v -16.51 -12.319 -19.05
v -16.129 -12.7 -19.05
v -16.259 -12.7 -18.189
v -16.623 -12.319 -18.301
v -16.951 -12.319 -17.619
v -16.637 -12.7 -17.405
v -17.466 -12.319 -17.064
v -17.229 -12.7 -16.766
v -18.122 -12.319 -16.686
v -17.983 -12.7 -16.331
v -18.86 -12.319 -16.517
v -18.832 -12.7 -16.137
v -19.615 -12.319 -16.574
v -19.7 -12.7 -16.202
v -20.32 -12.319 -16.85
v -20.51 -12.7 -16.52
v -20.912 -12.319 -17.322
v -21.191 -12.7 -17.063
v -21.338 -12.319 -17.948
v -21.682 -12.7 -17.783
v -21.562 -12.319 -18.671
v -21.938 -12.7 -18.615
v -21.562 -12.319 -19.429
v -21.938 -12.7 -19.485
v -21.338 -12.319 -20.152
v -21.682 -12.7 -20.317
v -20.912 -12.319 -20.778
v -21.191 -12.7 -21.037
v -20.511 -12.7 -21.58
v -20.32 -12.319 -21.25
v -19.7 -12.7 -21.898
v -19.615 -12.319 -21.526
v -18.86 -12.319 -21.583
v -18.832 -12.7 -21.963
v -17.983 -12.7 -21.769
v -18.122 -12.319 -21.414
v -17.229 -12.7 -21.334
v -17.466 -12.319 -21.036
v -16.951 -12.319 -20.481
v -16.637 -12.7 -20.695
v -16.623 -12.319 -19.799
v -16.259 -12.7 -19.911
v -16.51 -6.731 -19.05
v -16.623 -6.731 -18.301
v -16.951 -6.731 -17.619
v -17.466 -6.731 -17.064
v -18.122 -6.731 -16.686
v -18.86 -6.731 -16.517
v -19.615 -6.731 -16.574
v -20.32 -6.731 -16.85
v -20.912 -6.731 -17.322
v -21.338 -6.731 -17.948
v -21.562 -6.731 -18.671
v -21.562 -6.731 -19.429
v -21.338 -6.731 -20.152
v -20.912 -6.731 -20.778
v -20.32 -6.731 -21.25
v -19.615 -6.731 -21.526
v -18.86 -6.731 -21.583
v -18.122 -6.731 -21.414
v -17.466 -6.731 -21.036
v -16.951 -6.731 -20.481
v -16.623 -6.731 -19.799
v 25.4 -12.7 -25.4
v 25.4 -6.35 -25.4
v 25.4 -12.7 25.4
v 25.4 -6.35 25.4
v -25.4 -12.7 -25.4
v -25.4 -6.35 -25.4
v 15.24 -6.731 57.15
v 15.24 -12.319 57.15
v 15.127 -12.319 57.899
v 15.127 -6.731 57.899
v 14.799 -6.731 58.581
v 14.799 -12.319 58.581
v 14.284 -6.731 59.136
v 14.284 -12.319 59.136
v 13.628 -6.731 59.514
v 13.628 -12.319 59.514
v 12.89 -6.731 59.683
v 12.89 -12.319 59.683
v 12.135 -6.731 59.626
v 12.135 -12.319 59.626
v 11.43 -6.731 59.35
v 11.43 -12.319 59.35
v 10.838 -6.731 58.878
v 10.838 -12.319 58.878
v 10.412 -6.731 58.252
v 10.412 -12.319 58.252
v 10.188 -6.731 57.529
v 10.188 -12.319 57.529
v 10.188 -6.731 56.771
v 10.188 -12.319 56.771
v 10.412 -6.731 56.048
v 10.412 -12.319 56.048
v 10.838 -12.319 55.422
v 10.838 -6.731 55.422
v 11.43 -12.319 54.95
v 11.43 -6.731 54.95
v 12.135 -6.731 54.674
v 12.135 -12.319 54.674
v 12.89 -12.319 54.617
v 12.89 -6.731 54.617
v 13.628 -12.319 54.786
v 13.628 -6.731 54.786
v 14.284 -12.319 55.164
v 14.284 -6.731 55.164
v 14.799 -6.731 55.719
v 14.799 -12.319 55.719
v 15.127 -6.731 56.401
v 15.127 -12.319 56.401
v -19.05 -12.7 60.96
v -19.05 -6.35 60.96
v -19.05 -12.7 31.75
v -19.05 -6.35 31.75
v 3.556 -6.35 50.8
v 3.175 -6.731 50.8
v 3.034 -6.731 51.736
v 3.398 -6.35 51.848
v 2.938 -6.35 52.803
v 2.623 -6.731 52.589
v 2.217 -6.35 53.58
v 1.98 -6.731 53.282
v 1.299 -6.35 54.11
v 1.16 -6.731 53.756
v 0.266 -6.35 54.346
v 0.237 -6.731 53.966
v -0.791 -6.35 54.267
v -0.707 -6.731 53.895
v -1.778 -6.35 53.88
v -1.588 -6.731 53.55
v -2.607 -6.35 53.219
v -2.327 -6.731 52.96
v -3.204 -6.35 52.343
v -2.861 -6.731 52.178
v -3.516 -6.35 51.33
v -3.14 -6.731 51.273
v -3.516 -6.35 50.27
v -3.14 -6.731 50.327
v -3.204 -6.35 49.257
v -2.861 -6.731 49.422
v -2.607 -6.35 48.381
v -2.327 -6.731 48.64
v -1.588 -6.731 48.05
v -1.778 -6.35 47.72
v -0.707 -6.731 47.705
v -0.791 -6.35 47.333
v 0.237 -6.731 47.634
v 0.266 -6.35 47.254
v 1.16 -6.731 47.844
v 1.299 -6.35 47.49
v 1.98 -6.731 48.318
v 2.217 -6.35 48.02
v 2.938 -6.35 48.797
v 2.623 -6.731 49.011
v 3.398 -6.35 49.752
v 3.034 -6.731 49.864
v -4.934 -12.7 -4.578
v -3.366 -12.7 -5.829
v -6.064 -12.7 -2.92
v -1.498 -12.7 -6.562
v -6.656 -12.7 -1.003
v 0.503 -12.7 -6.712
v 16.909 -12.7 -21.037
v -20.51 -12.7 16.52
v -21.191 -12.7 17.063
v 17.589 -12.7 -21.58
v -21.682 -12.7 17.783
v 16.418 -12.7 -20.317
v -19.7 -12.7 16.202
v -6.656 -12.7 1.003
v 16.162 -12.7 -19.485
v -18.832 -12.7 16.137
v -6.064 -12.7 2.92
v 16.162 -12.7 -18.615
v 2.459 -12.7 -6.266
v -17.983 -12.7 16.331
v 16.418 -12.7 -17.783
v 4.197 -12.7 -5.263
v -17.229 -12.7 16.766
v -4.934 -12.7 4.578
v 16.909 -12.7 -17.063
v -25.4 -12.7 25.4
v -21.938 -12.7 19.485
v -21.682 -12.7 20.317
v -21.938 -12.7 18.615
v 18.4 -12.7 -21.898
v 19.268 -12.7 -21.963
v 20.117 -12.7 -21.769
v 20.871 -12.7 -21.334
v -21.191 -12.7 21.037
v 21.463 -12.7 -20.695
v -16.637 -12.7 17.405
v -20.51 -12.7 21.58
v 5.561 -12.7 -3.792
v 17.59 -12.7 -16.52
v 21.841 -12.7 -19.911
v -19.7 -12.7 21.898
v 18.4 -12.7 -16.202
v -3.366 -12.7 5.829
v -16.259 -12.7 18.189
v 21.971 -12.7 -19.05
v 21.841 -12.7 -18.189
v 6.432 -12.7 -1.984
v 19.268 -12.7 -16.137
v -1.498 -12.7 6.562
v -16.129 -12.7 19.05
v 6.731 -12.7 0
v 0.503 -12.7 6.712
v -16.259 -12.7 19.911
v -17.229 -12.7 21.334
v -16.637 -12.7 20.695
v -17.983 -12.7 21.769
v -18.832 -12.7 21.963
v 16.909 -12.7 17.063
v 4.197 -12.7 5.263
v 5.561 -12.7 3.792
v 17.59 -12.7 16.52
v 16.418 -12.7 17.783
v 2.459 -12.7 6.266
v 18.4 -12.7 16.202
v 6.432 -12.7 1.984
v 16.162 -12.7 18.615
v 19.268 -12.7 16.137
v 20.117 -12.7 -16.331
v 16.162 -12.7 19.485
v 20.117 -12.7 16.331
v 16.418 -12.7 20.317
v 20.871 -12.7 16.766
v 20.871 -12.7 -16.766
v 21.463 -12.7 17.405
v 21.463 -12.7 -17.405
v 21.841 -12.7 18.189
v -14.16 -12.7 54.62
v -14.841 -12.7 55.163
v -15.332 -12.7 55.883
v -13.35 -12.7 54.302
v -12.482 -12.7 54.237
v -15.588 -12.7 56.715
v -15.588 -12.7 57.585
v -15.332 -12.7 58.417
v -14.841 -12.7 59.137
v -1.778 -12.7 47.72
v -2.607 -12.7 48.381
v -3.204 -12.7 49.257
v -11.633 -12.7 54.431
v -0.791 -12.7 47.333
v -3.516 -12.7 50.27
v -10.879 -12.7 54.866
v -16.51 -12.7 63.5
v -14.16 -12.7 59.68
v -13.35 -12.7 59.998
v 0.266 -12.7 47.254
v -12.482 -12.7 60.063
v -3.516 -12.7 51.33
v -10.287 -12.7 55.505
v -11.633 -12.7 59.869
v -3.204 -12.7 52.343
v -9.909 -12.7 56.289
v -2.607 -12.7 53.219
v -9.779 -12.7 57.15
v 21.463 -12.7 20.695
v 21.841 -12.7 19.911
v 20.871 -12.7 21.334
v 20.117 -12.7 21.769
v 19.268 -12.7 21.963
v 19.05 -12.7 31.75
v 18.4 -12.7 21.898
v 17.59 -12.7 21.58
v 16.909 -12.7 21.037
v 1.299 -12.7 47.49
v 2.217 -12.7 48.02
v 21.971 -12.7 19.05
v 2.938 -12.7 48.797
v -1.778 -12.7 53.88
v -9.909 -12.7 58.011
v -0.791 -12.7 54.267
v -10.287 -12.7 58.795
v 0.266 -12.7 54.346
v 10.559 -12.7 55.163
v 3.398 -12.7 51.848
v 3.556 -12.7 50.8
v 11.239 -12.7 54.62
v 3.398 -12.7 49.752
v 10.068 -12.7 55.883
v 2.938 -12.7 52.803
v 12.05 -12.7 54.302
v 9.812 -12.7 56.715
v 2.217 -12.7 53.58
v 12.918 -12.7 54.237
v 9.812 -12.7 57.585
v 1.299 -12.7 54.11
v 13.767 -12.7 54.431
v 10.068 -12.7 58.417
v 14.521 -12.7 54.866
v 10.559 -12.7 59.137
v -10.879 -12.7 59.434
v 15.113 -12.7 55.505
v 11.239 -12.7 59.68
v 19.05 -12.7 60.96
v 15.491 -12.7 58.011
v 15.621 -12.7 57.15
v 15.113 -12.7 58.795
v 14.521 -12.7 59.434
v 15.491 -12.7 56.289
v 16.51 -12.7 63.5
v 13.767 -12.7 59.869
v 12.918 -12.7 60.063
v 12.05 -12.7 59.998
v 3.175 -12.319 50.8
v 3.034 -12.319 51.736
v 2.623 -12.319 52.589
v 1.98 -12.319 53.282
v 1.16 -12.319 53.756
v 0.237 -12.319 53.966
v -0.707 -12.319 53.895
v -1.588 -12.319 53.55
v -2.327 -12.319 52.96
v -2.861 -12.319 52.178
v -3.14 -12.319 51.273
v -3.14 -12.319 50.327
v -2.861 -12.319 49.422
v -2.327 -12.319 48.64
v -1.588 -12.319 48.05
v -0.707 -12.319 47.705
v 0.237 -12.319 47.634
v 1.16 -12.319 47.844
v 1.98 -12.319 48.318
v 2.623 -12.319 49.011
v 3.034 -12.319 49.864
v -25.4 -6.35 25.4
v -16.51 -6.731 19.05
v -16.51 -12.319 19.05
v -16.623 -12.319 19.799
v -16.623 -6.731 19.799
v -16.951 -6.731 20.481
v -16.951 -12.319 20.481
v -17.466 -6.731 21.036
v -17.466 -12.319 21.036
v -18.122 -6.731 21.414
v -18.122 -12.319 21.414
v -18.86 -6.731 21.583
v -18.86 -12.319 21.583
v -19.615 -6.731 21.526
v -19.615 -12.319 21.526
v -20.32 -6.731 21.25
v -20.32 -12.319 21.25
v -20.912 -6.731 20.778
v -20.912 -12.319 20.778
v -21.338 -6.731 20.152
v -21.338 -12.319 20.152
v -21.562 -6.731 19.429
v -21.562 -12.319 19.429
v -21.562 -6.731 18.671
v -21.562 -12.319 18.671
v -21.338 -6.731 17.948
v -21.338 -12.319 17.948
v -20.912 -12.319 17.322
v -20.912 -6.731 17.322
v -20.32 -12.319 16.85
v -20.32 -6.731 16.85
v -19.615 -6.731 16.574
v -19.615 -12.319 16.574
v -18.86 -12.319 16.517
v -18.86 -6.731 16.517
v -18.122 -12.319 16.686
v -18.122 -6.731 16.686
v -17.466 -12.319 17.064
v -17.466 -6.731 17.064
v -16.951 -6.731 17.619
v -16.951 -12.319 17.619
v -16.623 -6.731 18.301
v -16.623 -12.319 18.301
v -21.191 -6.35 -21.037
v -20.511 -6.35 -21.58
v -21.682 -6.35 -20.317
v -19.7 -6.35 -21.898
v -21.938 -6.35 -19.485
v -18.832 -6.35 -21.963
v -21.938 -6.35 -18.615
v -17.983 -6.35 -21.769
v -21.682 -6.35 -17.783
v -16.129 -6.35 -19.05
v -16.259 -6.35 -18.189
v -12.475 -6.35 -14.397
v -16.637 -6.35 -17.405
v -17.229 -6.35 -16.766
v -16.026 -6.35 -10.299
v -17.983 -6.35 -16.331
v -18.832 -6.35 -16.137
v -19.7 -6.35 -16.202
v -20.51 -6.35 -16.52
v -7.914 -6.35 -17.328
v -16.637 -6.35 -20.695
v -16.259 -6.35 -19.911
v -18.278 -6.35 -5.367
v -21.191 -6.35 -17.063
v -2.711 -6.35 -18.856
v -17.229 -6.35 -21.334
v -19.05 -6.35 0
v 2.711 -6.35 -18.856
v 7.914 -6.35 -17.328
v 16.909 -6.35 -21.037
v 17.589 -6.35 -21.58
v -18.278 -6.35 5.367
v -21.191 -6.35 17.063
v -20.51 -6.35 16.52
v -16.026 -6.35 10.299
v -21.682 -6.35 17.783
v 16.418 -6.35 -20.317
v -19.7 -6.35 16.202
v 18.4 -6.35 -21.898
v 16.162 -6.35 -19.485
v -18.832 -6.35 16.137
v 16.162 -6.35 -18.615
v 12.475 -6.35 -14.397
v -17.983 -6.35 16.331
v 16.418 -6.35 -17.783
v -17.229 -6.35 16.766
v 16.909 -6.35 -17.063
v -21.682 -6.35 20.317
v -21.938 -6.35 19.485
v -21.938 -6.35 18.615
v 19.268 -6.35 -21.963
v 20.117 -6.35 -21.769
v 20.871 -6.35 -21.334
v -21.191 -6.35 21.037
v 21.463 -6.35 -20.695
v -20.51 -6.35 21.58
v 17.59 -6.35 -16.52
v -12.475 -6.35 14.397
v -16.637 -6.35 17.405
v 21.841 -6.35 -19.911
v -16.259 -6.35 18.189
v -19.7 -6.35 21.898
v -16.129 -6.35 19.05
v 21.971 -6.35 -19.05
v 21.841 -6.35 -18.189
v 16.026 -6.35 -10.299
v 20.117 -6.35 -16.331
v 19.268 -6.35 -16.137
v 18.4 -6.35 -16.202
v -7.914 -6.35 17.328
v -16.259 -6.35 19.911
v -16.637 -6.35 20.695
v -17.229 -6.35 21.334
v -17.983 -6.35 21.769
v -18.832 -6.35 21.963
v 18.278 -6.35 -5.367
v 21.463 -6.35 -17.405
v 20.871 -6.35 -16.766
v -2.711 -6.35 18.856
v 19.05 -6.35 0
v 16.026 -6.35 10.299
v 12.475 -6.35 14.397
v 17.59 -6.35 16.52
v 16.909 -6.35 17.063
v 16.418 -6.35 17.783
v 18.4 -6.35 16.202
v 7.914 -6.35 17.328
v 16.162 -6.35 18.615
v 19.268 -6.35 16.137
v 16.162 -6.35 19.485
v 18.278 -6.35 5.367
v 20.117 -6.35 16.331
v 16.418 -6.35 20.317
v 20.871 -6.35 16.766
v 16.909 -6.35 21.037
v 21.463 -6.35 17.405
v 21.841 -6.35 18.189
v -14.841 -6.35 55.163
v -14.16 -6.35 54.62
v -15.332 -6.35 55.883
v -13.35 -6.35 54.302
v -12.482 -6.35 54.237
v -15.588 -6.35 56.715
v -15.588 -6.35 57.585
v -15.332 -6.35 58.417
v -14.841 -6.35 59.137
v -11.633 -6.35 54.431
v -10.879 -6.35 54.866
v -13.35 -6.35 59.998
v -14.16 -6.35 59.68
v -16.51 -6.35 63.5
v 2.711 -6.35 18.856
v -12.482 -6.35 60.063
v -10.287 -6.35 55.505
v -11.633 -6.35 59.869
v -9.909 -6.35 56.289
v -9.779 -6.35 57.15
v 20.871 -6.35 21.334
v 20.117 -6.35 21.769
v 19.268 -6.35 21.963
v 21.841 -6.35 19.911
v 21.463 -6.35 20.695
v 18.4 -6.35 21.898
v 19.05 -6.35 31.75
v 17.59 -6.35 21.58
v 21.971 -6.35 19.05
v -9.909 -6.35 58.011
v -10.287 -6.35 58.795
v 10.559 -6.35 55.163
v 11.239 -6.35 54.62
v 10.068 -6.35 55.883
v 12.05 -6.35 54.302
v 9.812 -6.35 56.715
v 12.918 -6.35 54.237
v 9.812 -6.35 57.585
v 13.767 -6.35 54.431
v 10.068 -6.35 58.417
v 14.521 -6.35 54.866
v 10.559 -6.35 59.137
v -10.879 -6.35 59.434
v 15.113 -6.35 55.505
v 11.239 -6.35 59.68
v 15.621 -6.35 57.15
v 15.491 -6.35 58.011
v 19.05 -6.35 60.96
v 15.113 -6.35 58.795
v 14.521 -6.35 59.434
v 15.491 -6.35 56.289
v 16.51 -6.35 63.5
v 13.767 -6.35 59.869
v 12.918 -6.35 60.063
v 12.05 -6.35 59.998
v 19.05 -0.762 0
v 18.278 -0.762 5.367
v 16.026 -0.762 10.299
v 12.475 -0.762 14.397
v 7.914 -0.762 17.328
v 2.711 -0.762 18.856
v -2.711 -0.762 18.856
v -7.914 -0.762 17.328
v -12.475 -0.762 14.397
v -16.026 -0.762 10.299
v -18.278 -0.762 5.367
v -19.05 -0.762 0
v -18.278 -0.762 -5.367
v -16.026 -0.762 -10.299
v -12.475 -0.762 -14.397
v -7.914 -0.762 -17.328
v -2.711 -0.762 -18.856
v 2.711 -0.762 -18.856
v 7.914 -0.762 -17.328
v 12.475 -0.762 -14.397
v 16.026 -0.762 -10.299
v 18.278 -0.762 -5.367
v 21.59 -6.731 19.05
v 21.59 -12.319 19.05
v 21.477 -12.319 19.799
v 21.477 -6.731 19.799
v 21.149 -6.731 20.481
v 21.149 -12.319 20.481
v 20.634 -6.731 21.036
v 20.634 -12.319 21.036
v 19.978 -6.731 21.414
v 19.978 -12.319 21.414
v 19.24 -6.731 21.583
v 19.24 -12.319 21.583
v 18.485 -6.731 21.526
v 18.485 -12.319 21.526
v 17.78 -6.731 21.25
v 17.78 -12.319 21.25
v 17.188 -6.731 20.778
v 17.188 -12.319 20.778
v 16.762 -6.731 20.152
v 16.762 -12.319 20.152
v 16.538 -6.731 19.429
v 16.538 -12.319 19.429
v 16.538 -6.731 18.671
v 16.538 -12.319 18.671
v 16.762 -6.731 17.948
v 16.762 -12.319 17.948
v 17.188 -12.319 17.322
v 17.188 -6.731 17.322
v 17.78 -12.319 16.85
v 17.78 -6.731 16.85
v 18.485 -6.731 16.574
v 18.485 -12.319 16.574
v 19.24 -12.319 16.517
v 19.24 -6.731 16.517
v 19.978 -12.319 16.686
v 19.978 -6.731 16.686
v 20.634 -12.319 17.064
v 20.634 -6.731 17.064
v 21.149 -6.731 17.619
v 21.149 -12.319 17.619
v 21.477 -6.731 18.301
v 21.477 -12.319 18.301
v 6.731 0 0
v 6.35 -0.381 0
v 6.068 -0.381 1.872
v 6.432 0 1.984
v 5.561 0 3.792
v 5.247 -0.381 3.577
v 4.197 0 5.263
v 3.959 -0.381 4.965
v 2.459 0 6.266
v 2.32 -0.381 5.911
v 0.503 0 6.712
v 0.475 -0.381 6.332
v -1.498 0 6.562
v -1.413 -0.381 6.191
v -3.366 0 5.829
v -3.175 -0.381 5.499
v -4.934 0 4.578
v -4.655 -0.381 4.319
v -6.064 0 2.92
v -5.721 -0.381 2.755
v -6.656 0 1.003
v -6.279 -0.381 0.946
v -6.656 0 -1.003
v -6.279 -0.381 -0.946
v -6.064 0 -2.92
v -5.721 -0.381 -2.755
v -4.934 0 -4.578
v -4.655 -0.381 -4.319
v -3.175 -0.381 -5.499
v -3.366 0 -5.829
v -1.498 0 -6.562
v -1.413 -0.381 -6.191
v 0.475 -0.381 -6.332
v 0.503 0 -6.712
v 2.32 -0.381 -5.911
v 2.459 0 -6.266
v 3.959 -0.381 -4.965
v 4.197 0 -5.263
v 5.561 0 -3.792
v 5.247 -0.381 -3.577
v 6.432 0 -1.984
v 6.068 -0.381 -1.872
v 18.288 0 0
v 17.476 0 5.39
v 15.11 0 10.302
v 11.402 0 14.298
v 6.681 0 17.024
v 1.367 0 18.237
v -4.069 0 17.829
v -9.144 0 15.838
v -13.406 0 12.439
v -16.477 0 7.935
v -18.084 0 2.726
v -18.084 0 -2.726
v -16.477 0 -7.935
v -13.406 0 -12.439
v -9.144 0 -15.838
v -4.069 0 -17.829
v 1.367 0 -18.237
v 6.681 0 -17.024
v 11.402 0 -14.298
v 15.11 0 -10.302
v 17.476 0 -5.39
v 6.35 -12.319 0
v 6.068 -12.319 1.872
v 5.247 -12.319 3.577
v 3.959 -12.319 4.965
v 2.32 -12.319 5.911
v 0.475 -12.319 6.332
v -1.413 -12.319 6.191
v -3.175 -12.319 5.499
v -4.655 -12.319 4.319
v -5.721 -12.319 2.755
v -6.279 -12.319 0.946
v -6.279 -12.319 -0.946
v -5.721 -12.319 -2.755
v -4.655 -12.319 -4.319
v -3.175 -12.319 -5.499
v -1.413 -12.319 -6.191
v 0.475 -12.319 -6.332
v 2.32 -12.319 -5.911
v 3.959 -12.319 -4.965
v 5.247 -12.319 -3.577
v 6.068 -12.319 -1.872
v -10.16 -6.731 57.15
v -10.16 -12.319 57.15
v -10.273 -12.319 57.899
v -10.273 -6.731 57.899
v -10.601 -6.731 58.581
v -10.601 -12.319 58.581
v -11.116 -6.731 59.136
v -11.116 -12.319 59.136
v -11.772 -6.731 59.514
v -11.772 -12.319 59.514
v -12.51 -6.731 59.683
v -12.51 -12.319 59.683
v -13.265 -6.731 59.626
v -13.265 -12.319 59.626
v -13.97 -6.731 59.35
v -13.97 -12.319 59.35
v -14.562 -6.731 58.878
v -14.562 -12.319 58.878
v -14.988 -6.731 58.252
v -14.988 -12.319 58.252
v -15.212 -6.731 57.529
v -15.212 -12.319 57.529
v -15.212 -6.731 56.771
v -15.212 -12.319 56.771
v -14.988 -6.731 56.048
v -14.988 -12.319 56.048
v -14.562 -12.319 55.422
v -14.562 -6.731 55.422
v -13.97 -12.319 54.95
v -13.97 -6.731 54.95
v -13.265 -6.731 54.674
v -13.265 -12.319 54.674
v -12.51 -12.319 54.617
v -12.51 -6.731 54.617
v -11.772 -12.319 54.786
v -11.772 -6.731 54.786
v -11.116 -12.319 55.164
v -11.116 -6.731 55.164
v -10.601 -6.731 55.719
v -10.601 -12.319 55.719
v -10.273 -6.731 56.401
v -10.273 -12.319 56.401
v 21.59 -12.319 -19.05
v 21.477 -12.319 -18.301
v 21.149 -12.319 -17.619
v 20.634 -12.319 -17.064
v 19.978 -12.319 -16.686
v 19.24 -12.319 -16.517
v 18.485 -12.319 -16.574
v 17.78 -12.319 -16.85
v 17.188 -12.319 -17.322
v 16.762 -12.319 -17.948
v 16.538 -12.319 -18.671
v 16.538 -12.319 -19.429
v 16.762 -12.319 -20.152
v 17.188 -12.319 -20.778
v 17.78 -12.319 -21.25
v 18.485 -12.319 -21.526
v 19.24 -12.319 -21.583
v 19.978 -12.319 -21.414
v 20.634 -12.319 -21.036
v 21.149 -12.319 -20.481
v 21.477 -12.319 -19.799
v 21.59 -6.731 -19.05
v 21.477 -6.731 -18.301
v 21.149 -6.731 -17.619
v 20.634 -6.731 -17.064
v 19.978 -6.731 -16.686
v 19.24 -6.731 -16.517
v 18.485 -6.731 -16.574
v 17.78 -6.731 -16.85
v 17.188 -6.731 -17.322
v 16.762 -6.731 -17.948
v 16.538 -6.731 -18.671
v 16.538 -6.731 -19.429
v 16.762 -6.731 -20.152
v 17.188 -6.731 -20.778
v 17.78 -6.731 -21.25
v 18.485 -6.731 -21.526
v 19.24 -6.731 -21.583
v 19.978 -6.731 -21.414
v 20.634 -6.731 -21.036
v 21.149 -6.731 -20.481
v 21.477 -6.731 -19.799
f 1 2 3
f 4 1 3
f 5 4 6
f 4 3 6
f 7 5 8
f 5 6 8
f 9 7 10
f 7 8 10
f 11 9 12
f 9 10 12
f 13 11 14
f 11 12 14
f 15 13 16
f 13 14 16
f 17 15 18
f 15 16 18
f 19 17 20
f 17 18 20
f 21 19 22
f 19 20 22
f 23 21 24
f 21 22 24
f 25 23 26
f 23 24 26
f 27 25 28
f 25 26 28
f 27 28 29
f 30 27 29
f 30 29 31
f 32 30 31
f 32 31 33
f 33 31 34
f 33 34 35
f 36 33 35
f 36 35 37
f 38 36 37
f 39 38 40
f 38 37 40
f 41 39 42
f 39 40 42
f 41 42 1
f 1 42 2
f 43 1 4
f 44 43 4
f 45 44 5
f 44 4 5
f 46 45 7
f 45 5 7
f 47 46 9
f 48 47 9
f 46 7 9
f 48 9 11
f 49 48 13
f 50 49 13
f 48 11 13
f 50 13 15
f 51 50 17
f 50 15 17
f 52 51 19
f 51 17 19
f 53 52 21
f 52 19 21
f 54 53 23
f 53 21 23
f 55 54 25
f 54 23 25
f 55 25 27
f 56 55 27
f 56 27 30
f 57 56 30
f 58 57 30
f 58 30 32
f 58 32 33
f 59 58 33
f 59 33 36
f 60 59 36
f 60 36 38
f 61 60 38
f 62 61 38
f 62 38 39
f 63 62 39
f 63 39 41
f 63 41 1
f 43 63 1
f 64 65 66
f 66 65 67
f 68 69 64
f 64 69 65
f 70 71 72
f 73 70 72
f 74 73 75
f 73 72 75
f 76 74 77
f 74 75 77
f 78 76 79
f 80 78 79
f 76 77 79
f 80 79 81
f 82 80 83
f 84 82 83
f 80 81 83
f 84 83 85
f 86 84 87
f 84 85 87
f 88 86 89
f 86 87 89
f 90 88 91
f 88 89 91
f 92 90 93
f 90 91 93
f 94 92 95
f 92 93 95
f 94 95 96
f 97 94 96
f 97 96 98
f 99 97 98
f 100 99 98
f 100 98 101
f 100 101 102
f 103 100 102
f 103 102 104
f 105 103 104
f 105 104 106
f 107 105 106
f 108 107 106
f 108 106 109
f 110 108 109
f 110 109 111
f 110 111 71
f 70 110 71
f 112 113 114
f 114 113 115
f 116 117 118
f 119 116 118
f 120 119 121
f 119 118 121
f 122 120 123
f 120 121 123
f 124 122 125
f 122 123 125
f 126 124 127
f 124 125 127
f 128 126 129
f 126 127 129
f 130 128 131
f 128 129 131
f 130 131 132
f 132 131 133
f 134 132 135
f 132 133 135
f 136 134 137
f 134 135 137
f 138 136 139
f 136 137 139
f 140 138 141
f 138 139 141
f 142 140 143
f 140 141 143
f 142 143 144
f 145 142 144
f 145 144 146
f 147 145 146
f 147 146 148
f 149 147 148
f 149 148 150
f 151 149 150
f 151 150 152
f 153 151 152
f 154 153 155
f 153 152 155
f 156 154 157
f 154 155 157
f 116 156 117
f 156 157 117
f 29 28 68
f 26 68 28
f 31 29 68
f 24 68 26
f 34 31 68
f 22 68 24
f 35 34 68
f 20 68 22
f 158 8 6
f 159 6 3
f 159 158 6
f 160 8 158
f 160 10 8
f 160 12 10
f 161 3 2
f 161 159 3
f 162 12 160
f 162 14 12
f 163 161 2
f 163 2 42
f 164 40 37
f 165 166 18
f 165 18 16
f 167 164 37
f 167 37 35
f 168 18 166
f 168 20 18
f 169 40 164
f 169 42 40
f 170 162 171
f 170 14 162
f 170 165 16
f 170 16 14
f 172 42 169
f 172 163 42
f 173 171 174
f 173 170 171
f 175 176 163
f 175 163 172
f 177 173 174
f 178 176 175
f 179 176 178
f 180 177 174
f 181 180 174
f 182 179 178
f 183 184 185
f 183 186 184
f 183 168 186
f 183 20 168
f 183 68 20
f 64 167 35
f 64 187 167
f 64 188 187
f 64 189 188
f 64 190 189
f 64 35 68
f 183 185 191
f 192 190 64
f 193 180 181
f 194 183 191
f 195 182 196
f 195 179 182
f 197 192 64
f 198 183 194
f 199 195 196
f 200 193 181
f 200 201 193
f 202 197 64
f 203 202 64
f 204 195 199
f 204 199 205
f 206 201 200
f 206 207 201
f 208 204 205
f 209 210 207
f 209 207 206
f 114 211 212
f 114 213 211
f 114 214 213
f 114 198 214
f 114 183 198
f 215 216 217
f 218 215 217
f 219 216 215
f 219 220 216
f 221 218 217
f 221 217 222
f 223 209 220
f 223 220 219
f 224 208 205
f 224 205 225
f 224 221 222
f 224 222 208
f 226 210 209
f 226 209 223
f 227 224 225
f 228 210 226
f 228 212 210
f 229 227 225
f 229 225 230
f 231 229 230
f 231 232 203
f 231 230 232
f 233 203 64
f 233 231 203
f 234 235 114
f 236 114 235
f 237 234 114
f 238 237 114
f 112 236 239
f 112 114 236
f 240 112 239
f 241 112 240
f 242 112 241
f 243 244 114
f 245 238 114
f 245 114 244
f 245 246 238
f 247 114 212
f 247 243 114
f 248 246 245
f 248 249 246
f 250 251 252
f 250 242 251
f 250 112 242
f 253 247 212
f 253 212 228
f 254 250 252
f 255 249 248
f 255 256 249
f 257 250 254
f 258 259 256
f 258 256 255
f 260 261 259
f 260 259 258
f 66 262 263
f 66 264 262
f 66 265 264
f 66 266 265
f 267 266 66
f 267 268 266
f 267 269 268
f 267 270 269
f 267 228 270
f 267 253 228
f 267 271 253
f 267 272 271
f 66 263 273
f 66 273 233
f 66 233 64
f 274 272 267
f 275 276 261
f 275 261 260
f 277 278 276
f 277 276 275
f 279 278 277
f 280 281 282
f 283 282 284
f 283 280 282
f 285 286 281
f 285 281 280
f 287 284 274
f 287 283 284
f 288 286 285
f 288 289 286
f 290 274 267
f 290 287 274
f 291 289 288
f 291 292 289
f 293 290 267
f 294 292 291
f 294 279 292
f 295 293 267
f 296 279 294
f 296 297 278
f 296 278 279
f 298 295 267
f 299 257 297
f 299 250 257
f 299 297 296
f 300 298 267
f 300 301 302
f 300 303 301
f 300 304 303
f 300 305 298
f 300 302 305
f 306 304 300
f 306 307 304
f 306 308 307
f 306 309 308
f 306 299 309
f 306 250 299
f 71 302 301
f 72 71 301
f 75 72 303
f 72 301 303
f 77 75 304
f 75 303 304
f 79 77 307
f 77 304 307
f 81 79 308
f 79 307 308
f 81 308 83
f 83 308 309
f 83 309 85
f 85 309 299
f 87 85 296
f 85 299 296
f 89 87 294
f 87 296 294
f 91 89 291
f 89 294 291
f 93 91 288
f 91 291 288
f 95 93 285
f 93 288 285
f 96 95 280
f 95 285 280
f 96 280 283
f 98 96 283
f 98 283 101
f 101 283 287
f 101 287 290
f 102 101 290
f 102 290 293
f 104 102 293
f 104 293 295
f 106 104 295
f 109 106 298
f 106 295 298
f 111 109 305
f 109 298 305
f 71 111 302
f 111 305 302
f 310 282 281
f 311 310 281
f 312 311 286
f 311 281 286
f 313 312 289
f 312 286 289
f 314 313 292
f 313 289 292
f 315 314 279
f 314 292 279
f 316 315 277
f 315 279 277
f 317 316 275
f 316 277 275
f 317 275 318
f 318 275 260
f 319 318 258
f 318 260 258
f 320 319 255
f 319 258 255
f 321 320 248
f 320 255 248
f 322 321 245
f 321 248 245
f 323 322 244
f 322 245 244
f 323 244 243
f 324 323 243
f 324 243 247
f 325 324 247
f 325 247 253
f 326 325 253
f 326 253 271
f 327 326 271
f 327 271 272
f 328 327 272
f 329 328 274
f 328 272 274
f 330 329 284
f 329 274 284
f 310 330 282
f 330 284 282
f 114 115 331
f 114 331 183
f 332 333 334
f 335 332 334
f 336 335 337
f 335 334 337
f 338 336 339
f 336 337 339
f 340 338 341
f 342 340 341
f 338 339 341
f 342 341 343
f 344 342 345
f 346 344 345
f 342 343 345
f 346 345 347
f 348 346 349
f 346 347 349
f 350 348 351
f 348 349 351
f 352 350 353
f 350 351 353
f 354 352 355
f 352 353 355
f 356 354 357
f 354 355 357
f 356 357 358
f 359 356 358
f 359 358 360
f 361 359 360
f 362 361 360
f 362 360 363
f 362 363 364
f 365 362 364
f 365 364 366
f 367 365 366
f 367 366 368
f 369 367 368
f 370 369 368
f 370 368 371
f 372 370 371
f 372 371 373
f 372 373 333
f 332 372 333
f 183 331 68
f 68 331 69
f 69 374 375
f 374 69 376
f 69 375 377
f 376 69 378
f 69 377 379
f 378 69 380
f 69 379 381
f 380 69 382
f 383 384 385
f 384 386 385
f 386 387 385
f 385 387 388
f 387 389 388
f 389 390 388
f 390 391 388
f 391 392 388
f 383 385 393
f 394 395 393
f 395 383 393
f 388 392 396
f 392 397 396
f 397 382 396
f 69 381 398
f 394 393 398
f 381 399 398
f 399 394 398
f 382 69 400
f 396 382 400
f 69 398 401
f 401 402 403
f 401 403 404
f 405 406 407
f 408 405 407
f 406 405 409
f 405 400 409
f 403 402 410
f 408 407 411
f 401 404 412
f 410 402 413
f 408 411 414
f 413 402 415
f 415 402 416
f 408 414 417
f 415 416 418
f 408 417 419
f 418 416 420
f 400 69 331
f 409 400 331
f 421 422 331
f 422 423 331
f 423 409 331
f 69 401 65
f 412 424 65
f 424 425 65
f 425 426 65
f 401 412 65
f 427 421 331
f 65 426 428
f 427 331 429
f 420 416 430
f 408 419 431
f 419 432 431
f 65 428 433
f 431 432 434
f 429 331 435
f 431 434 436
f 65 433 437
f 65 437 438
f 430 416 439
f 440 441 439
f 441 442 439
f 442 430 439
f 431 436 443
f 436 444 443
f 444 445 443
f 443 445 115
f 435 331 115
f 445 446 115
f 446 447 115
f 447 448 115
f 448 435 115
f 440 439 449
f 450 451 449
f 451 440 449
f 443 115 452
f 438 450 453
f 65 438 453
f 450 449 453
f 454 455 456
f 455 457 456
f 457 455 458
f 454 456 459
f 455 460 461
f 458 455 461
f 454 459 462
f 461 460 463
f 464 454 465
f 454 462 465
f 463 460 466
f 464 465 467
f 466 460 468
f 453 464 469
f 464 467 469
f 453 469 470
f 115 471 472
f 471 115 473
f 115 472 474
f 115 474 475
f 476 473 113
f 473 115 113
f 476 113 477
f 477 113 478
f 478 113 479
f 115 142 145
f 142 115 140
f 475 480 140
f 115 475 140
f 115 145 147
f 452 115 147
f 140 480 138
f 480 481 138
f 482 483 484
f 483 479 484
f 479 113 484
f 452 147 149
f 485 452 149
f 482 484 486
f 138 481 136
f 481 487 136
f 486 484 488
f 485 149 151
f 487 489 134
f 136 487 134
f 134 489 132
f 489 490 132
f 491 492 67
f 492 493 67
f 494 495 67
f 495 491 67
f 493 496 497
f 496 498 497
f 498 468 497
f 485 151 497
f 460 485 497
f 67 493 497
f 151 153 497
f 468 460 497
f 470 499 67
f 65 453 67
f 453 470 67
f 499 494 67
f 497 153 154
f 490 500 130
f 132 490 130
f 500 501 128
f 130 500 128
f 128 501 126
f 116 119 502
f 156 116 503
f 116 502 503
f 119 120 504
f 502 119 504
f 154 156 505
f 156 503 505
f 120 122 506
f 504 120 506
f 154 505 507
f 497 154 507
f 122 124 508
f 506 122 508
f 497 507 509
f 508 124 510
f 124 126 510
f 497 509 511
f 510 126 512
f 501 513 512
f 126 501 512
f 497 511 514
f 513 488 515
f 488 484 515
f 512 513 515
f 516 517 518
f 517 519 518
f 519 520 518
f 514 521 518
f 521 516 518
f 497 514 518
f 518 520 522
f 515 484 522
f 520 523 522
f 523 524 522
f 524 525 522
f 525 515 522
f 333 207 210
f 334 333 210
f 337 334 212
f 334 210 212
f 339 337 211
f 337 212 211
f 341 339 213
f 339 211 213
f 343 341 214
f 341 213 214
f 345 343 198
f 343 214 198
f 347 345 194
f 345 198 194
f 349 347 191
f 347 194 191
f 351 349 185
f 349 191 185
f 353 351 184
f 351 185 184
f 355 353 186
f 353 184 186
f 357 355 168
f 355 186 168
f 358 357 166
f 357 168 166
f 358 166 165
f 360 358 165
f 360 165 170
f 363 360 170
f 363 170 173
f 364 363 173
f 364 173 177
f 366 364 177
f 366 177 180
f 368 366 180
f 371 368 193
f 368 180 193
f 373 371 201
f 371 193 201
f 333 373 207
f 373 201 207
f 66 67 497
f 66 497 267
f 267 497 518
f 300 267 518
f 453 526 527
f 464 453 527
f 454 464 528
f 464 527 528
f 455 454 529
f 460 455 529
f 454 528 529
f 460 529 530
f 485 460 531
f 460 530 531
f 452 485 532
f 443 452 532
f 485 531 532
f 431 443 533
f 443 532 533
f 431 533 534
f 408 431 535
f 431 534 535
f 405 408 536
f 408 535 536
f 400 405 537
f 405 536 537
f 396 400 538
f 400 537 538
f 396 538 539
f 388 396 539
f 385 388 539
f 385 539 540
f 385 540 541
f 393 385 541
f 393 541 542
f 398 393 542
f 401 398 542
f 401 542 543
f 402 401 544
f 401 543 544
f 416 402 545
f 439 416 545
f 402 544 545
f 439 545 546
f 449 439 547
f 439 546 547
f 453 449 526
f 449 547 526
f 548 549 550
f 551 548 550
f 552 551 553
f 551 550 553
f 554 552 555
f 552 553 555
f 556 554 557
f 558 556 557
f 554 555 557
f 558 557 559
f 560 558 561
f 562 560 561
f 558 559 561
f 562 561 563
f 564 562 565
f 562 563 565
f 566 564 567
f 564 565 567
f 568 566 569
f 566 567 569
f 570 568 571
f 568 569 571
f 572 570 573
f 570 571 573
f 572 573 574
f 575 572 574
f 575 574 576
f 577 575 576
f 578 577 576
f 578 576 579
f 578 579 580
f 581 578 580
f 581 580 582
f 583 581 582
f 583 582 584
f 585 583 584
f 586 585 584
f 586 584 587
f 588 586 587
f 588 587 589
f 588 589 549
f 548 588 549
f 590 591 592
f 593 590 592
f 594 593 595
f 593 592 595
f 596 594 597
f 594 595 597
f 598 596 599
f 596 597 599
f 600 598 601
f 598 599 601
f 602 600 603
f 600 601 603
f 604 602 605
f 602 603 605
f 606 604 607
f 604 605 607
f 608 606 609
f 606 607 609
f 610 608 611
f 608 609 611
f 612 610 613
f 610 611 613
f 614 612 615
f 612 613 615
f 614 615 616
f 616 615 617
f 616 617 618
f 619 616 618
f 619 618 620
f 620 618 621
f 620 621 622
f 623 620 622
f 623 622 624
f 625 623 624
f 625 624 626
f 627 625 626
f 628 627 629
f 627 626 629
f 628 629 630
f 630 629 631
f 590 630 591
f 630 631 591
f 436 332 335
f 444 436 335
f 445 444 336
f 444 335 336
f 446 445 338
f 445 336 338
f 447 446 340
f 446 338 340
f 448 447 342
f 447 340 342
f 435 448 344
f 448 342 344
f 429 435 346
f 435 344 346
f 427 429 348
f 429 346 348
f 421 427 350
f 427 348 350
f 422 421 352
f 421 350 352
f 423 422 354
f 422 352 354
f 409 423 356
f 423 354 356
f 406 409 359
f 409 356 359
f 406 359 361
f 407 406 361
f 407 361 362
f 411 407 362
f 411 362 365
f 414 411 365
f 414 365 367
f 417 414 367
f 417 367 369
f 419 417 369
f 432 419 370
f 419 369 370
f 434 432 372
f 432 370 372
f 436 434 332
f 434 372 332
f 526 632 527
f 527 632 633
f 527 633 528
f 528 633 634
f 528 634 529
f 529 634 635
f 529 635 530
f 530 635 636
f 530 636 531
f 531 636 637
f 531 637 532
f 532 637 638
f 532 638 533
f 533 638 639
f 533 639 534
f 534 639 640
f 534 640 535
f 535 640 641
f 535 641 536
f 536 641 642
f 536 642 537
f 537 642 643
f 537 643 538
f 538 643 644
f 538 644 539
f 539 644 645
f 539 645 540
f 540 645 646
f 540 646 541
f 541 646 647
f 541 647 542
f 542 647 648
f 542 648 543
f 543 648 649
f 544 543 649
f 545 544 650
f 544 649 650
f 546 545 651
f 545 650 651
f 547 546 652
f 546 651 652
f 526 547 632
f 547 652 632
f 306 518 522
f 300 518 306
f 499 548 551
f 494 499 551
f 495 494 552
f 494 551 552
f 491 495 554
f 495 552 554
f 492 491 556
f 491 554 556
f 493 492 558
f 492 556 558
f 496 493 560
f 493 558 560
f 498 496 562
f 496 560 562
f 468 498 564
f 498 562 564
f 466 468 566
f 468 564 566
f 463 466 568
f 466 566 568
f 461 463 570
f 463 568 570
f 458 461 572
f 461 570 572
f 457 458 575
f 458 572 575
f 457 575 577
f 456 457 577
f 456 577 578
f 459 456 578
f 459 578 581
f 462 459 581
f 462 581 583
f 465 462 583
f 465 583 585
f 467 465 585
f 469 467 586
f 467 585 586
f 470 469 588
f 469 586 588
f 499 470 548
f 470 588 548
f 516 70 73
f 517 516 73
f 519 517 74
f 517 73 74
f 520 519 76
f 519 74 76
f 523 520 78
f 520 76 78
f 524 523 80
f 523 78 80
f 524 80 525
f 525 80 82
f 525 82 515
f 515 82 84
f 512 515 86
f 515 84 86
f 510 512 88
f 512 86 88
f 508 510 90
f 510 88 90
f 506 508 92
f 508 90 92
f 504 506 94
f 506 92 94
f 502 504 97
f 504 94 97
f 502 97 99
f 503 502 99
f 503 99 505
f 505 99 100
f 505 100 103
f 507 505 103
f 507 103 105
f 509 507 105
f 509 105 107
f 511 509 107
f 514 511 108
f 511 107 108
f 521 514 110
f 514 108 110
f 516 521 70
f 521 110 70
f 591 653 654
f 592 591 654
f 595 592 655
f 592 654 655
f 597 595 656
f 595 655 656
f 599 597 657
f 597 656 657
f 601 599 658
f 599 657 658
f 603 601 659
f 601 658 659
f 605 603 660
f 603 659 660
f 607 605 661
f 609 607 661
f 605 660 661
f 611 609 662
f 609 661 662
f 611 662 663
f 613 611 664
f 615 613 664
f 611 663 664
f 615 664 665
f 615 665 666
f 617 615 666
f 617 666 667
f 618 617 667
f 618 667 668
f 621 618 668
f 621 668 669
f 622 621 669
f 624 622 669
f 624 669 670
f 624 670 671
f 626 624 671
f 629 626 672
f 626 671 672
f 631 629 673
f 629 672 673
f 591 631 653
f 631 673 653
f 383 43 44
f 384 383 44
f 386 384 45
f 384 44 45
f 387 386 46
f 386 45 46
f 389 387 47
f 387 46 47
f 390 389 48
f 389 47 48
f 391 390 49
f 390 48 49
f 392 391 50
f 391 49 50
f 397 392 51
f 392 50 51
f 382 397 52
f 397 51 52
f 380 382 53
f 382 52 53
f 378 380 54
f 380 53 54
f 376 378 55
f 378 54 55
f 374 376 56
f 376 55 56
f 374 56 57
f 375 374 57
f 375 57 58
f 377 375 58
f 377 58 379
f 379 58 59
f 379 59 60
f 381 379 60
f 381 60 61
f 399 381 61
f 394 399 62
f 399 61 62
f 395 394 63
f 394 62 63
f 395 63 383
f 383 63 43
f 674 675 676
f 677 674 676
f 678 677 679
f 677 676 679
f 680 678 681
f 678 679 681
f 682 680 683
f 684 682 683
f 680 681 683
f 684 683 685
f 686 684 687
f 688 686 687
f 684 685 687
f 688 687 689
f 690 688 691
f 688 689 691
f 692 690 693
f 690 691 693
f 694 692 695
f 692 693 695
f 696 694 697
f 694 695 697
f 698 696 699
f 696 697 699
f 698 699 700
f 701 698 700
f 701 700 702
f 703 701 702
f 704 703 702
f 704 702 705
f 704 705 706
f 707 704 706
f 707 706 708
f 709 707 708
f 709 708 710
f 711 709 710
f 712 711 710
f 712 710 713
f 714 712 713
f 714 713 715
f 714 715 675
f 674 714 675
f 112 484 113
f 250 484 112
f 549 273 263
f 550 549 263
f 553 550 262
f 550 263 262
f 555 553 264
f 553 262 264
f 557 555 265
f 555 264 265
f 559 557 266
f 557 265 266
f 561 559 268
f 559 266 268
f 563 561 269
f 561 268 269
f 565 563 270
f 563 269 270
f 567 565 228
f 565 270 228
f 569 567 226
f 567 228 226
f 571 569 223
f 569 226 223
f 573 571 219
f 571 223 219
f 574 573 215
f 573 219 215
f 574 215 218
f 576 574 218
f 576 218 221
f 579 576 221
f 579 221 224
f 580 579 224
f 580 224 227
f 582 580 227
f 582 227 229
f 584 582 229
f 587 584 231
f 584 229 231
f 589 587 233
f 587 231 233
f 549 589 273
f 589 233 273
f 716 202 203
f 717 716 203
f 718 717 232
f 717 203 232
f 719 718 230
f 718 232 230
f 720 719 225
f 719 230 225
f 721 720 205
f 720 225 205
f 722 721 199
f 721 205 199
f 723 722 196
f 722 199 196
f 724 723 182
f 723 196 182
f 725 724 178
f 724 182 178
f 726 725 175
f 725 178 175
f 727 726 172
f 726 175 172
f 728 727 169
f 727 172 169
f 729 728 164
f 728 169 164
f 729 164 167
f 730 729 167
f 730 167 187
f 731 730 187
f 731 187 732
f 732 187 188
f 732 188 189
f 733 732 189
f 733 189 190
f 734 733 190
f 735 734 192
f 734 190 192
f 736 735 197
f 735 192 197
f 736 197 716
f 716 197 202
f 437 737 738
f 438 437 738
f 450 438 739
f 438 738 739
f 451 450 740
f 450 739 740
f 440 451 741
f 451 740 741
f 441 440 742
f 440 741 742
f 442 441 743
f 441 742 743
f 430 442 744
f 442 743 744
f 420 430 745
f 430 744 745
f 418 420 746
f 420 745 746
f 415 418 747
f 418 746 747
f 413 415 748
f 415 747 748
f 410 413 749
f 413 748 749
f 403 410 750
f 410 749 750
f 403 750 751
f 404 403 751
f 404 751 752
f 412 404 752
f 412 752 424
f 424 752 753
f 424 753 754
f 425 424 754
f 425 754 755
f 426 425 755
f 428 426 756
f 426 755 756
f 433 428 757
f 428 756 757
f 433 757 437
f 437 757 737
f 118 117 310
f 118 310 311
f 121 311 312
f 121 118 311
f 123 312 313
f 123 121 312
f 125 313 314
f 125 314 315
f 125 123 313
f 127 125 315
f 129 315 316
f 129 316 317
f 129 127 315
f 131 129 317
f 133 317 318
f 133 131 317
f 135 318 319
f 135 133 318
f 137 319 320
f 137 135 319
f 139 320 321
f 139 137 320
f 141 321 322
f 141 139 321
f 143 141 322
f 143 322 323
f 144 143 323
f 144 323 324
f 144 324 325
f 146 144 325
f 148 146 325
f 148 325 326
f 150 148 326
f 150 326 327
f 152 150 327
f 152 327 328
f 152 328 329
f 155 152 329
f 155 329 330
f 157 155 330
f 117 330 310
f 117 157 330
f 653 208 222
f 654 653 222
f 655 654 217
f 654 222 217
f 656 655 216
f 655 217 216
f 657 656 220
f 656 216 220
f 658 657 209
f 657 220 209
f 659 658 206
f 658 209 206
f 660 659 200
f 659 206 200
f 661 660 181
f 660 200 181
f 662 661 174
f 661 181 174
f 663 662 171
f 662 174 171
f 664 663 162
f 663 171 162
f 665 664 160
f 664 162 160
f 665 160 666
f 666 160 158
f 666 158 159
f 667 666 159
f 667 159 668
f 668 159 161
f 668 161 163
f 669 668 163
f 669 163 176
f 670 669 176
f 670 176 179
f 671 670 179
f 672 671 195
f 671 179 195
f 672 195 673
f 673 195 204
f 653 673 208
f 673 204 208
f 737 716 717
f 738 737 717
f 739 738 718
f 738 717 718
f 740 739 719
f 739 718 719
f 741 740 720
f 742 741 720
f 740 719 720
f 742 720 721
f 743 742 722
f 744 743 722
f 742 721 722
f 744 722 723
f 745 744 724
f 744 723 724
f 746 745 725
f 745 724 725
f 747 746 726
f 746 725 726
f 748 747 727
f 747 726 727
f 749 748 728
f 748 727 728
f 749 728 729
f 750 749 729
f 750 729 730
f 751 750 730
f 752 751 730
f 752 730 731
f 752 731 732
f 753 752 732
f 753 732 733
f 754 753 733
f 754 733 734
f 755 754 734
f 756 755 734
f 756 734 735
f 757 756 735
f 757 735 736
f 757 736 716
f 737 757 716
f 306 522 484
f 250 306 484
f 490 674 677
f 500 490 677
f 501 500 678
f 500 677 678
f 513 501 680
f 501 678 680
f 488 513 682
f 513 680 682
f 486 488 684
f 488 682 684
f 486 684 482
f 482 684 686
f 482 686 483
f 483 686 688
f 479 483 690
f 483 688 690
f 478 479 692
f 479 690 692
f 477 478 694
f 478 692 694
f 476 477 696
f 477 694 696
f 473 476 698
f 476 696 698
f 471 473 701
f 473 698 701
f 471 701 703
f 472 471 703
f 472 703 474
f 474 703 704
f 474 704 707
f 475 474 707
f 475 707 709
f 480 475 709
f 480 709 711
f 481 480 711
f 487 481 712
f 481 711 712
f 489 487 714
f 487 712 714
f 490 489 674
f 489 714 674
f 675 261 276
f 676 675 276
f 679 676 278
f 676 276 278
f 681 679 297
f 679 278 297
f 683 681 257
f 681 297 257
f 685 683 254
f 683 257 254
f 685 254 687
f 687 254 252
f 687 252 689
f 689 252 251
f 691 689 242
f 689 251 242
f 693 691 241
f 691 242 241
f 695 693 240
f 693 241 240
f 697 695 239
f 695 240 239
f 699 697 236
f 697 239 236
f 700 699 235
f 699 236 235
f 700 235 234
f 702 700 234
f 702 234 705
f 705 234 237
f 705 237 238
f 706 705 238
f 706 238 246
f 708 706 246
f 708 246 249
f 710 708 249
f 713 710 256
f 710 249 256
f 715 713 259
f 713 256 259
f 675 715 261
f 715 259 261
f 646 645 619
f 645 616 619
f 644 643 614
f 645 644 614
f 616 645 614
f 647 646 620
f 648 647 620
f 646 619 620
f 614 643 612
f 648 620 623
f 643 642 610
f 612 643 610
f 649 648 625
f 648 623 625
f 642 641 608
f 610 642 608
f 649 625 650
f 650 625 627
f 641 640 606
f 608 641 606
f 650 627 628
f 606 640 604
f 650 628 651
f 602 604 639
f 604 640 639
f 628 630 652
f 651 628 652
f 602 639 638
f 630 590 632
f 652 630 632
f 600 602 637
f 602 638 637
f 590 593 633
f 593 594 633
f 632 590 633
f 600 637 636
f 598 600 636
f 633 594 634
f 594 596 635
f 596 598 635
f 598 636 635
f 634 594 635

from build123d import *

# Parameters (mm, degrees)
F0_R     = 19.05
F1_DEPTH = 6.35
F2_R     = 3.175
F3_DEPTH = 6.35
F4_SIZE  = 0.762
F5_R     = 6.35
F5_R_2   = 2.54
F6_DEPTH = 12.7
F7_SIZE  = 0.381
F8_SIZE  = 6.34999
F9_SIZE  = 2.54


# Not quite as in the source:
# - a fillet or chamfer is up to 0.001 mm smaller than in the source, because OpenCascade refuses the exact size


with BuildPart() as f1:
    # F0 (on Front) → F1 (new body)
    with BuildSketch(Plane.XZ):
        Circle(F0_R)
    extrude(amount=F1_DEPTH)

    # F2 (on face) → F3 (join)
    with BuildSketch(Plane.XZ.offset(6.35)):
        Polygon((-19.05, 25.4), (-25.4, 25.4), (-25.4, -25.4), (25.4, -25.4), (25.4, 25.4), (19.05, 25.4), (19.05, 63.5), (-19.05, 63.5), align=None)
        with Locations((0, 50.8)):
            Circle(F2_R, mode=Mode.SUBTRACT)
    extrude(amount=F3_DEPTH)

    # F4
    f4_edges = [f1.edges().sort_by_distance(p)[0] for p in [
        (-19.05, 0, 0),
    ]]
    chamfer(f4_edges, length=F4_SIZE)

    # F5 (on face) → F6 (cut)
    with BuildSketch(Plane.XZ.offset(12.7)):
        Circle(F5_R)
        with Locations((-19.05, 19.05)):
            Circle(F5_R_2)
        with Locations((19.05, 19.05)):
            Circle(F5_R_2)
        with Locations((19.05, -19.05)):
            Circle(F5_R_2)
        with Locations((-19.05, -19.05)):
            Circle(F5_R_2)
        with Locations((-12.7, 57.15)):
            Circle(F5_R_2)
        with Locations((12.7, 57.15)):
            Circle(F5_R_2)
    extrude(amount=-F6_DEPTH, mode=Mode.SUBTRACT)

    # F7
    f7_edges = [f1.edges().sort_by_distance(p)[0] for p in [
        (-21.59, -12.7, 19.05),
        (16.51, -12.7, 19.05),
        (16.51, -12.7, -19.05),
        (-21.59, -12.7, -19.05),
        (-6.35, -12.7, 0),
        (-6.35, 0, 0),
        (16.51, -6.35, -19.05),
        (-21.59, -6.35, -19.05),
        (-21.59, -6.35, 19.05),
        (16.51, -6.35, 19.05),
        (-15.24, -12.7, 57.15),
        (10.16, -12.7, 57.15),
        (-15.24, -6.35, 57.15),
        (10.16, -6.35, 57.15),
        (-3.175, -6.35, 50.8),
        (-3.175, -12.7, 50.8),
    ]]
    chamfer(f7_edges, length=F7_SIZE)

    # F8 (size 6.35 in the source; OpenCascade refuses exactly that, so slightly less here)
    f8_edges = [f1.edges().sort_by_distance(p)[0] for p in [
        (-19.05, -9.525, 25.4),
        (19.05, -9.525, 25.4),
    ]]
    chamfer(f8_edges, length=F8_SIZE)

    # F9
    f9_edges = [f1.edges().sort_by_distance(p)[0] for p in [
        (-19.05, -9.525, 63.5),
        (19.05, -9.525, 63.5),
    ]]
    chamfer(f9_edges, length=F9_SIZE)


solid = f1.part
